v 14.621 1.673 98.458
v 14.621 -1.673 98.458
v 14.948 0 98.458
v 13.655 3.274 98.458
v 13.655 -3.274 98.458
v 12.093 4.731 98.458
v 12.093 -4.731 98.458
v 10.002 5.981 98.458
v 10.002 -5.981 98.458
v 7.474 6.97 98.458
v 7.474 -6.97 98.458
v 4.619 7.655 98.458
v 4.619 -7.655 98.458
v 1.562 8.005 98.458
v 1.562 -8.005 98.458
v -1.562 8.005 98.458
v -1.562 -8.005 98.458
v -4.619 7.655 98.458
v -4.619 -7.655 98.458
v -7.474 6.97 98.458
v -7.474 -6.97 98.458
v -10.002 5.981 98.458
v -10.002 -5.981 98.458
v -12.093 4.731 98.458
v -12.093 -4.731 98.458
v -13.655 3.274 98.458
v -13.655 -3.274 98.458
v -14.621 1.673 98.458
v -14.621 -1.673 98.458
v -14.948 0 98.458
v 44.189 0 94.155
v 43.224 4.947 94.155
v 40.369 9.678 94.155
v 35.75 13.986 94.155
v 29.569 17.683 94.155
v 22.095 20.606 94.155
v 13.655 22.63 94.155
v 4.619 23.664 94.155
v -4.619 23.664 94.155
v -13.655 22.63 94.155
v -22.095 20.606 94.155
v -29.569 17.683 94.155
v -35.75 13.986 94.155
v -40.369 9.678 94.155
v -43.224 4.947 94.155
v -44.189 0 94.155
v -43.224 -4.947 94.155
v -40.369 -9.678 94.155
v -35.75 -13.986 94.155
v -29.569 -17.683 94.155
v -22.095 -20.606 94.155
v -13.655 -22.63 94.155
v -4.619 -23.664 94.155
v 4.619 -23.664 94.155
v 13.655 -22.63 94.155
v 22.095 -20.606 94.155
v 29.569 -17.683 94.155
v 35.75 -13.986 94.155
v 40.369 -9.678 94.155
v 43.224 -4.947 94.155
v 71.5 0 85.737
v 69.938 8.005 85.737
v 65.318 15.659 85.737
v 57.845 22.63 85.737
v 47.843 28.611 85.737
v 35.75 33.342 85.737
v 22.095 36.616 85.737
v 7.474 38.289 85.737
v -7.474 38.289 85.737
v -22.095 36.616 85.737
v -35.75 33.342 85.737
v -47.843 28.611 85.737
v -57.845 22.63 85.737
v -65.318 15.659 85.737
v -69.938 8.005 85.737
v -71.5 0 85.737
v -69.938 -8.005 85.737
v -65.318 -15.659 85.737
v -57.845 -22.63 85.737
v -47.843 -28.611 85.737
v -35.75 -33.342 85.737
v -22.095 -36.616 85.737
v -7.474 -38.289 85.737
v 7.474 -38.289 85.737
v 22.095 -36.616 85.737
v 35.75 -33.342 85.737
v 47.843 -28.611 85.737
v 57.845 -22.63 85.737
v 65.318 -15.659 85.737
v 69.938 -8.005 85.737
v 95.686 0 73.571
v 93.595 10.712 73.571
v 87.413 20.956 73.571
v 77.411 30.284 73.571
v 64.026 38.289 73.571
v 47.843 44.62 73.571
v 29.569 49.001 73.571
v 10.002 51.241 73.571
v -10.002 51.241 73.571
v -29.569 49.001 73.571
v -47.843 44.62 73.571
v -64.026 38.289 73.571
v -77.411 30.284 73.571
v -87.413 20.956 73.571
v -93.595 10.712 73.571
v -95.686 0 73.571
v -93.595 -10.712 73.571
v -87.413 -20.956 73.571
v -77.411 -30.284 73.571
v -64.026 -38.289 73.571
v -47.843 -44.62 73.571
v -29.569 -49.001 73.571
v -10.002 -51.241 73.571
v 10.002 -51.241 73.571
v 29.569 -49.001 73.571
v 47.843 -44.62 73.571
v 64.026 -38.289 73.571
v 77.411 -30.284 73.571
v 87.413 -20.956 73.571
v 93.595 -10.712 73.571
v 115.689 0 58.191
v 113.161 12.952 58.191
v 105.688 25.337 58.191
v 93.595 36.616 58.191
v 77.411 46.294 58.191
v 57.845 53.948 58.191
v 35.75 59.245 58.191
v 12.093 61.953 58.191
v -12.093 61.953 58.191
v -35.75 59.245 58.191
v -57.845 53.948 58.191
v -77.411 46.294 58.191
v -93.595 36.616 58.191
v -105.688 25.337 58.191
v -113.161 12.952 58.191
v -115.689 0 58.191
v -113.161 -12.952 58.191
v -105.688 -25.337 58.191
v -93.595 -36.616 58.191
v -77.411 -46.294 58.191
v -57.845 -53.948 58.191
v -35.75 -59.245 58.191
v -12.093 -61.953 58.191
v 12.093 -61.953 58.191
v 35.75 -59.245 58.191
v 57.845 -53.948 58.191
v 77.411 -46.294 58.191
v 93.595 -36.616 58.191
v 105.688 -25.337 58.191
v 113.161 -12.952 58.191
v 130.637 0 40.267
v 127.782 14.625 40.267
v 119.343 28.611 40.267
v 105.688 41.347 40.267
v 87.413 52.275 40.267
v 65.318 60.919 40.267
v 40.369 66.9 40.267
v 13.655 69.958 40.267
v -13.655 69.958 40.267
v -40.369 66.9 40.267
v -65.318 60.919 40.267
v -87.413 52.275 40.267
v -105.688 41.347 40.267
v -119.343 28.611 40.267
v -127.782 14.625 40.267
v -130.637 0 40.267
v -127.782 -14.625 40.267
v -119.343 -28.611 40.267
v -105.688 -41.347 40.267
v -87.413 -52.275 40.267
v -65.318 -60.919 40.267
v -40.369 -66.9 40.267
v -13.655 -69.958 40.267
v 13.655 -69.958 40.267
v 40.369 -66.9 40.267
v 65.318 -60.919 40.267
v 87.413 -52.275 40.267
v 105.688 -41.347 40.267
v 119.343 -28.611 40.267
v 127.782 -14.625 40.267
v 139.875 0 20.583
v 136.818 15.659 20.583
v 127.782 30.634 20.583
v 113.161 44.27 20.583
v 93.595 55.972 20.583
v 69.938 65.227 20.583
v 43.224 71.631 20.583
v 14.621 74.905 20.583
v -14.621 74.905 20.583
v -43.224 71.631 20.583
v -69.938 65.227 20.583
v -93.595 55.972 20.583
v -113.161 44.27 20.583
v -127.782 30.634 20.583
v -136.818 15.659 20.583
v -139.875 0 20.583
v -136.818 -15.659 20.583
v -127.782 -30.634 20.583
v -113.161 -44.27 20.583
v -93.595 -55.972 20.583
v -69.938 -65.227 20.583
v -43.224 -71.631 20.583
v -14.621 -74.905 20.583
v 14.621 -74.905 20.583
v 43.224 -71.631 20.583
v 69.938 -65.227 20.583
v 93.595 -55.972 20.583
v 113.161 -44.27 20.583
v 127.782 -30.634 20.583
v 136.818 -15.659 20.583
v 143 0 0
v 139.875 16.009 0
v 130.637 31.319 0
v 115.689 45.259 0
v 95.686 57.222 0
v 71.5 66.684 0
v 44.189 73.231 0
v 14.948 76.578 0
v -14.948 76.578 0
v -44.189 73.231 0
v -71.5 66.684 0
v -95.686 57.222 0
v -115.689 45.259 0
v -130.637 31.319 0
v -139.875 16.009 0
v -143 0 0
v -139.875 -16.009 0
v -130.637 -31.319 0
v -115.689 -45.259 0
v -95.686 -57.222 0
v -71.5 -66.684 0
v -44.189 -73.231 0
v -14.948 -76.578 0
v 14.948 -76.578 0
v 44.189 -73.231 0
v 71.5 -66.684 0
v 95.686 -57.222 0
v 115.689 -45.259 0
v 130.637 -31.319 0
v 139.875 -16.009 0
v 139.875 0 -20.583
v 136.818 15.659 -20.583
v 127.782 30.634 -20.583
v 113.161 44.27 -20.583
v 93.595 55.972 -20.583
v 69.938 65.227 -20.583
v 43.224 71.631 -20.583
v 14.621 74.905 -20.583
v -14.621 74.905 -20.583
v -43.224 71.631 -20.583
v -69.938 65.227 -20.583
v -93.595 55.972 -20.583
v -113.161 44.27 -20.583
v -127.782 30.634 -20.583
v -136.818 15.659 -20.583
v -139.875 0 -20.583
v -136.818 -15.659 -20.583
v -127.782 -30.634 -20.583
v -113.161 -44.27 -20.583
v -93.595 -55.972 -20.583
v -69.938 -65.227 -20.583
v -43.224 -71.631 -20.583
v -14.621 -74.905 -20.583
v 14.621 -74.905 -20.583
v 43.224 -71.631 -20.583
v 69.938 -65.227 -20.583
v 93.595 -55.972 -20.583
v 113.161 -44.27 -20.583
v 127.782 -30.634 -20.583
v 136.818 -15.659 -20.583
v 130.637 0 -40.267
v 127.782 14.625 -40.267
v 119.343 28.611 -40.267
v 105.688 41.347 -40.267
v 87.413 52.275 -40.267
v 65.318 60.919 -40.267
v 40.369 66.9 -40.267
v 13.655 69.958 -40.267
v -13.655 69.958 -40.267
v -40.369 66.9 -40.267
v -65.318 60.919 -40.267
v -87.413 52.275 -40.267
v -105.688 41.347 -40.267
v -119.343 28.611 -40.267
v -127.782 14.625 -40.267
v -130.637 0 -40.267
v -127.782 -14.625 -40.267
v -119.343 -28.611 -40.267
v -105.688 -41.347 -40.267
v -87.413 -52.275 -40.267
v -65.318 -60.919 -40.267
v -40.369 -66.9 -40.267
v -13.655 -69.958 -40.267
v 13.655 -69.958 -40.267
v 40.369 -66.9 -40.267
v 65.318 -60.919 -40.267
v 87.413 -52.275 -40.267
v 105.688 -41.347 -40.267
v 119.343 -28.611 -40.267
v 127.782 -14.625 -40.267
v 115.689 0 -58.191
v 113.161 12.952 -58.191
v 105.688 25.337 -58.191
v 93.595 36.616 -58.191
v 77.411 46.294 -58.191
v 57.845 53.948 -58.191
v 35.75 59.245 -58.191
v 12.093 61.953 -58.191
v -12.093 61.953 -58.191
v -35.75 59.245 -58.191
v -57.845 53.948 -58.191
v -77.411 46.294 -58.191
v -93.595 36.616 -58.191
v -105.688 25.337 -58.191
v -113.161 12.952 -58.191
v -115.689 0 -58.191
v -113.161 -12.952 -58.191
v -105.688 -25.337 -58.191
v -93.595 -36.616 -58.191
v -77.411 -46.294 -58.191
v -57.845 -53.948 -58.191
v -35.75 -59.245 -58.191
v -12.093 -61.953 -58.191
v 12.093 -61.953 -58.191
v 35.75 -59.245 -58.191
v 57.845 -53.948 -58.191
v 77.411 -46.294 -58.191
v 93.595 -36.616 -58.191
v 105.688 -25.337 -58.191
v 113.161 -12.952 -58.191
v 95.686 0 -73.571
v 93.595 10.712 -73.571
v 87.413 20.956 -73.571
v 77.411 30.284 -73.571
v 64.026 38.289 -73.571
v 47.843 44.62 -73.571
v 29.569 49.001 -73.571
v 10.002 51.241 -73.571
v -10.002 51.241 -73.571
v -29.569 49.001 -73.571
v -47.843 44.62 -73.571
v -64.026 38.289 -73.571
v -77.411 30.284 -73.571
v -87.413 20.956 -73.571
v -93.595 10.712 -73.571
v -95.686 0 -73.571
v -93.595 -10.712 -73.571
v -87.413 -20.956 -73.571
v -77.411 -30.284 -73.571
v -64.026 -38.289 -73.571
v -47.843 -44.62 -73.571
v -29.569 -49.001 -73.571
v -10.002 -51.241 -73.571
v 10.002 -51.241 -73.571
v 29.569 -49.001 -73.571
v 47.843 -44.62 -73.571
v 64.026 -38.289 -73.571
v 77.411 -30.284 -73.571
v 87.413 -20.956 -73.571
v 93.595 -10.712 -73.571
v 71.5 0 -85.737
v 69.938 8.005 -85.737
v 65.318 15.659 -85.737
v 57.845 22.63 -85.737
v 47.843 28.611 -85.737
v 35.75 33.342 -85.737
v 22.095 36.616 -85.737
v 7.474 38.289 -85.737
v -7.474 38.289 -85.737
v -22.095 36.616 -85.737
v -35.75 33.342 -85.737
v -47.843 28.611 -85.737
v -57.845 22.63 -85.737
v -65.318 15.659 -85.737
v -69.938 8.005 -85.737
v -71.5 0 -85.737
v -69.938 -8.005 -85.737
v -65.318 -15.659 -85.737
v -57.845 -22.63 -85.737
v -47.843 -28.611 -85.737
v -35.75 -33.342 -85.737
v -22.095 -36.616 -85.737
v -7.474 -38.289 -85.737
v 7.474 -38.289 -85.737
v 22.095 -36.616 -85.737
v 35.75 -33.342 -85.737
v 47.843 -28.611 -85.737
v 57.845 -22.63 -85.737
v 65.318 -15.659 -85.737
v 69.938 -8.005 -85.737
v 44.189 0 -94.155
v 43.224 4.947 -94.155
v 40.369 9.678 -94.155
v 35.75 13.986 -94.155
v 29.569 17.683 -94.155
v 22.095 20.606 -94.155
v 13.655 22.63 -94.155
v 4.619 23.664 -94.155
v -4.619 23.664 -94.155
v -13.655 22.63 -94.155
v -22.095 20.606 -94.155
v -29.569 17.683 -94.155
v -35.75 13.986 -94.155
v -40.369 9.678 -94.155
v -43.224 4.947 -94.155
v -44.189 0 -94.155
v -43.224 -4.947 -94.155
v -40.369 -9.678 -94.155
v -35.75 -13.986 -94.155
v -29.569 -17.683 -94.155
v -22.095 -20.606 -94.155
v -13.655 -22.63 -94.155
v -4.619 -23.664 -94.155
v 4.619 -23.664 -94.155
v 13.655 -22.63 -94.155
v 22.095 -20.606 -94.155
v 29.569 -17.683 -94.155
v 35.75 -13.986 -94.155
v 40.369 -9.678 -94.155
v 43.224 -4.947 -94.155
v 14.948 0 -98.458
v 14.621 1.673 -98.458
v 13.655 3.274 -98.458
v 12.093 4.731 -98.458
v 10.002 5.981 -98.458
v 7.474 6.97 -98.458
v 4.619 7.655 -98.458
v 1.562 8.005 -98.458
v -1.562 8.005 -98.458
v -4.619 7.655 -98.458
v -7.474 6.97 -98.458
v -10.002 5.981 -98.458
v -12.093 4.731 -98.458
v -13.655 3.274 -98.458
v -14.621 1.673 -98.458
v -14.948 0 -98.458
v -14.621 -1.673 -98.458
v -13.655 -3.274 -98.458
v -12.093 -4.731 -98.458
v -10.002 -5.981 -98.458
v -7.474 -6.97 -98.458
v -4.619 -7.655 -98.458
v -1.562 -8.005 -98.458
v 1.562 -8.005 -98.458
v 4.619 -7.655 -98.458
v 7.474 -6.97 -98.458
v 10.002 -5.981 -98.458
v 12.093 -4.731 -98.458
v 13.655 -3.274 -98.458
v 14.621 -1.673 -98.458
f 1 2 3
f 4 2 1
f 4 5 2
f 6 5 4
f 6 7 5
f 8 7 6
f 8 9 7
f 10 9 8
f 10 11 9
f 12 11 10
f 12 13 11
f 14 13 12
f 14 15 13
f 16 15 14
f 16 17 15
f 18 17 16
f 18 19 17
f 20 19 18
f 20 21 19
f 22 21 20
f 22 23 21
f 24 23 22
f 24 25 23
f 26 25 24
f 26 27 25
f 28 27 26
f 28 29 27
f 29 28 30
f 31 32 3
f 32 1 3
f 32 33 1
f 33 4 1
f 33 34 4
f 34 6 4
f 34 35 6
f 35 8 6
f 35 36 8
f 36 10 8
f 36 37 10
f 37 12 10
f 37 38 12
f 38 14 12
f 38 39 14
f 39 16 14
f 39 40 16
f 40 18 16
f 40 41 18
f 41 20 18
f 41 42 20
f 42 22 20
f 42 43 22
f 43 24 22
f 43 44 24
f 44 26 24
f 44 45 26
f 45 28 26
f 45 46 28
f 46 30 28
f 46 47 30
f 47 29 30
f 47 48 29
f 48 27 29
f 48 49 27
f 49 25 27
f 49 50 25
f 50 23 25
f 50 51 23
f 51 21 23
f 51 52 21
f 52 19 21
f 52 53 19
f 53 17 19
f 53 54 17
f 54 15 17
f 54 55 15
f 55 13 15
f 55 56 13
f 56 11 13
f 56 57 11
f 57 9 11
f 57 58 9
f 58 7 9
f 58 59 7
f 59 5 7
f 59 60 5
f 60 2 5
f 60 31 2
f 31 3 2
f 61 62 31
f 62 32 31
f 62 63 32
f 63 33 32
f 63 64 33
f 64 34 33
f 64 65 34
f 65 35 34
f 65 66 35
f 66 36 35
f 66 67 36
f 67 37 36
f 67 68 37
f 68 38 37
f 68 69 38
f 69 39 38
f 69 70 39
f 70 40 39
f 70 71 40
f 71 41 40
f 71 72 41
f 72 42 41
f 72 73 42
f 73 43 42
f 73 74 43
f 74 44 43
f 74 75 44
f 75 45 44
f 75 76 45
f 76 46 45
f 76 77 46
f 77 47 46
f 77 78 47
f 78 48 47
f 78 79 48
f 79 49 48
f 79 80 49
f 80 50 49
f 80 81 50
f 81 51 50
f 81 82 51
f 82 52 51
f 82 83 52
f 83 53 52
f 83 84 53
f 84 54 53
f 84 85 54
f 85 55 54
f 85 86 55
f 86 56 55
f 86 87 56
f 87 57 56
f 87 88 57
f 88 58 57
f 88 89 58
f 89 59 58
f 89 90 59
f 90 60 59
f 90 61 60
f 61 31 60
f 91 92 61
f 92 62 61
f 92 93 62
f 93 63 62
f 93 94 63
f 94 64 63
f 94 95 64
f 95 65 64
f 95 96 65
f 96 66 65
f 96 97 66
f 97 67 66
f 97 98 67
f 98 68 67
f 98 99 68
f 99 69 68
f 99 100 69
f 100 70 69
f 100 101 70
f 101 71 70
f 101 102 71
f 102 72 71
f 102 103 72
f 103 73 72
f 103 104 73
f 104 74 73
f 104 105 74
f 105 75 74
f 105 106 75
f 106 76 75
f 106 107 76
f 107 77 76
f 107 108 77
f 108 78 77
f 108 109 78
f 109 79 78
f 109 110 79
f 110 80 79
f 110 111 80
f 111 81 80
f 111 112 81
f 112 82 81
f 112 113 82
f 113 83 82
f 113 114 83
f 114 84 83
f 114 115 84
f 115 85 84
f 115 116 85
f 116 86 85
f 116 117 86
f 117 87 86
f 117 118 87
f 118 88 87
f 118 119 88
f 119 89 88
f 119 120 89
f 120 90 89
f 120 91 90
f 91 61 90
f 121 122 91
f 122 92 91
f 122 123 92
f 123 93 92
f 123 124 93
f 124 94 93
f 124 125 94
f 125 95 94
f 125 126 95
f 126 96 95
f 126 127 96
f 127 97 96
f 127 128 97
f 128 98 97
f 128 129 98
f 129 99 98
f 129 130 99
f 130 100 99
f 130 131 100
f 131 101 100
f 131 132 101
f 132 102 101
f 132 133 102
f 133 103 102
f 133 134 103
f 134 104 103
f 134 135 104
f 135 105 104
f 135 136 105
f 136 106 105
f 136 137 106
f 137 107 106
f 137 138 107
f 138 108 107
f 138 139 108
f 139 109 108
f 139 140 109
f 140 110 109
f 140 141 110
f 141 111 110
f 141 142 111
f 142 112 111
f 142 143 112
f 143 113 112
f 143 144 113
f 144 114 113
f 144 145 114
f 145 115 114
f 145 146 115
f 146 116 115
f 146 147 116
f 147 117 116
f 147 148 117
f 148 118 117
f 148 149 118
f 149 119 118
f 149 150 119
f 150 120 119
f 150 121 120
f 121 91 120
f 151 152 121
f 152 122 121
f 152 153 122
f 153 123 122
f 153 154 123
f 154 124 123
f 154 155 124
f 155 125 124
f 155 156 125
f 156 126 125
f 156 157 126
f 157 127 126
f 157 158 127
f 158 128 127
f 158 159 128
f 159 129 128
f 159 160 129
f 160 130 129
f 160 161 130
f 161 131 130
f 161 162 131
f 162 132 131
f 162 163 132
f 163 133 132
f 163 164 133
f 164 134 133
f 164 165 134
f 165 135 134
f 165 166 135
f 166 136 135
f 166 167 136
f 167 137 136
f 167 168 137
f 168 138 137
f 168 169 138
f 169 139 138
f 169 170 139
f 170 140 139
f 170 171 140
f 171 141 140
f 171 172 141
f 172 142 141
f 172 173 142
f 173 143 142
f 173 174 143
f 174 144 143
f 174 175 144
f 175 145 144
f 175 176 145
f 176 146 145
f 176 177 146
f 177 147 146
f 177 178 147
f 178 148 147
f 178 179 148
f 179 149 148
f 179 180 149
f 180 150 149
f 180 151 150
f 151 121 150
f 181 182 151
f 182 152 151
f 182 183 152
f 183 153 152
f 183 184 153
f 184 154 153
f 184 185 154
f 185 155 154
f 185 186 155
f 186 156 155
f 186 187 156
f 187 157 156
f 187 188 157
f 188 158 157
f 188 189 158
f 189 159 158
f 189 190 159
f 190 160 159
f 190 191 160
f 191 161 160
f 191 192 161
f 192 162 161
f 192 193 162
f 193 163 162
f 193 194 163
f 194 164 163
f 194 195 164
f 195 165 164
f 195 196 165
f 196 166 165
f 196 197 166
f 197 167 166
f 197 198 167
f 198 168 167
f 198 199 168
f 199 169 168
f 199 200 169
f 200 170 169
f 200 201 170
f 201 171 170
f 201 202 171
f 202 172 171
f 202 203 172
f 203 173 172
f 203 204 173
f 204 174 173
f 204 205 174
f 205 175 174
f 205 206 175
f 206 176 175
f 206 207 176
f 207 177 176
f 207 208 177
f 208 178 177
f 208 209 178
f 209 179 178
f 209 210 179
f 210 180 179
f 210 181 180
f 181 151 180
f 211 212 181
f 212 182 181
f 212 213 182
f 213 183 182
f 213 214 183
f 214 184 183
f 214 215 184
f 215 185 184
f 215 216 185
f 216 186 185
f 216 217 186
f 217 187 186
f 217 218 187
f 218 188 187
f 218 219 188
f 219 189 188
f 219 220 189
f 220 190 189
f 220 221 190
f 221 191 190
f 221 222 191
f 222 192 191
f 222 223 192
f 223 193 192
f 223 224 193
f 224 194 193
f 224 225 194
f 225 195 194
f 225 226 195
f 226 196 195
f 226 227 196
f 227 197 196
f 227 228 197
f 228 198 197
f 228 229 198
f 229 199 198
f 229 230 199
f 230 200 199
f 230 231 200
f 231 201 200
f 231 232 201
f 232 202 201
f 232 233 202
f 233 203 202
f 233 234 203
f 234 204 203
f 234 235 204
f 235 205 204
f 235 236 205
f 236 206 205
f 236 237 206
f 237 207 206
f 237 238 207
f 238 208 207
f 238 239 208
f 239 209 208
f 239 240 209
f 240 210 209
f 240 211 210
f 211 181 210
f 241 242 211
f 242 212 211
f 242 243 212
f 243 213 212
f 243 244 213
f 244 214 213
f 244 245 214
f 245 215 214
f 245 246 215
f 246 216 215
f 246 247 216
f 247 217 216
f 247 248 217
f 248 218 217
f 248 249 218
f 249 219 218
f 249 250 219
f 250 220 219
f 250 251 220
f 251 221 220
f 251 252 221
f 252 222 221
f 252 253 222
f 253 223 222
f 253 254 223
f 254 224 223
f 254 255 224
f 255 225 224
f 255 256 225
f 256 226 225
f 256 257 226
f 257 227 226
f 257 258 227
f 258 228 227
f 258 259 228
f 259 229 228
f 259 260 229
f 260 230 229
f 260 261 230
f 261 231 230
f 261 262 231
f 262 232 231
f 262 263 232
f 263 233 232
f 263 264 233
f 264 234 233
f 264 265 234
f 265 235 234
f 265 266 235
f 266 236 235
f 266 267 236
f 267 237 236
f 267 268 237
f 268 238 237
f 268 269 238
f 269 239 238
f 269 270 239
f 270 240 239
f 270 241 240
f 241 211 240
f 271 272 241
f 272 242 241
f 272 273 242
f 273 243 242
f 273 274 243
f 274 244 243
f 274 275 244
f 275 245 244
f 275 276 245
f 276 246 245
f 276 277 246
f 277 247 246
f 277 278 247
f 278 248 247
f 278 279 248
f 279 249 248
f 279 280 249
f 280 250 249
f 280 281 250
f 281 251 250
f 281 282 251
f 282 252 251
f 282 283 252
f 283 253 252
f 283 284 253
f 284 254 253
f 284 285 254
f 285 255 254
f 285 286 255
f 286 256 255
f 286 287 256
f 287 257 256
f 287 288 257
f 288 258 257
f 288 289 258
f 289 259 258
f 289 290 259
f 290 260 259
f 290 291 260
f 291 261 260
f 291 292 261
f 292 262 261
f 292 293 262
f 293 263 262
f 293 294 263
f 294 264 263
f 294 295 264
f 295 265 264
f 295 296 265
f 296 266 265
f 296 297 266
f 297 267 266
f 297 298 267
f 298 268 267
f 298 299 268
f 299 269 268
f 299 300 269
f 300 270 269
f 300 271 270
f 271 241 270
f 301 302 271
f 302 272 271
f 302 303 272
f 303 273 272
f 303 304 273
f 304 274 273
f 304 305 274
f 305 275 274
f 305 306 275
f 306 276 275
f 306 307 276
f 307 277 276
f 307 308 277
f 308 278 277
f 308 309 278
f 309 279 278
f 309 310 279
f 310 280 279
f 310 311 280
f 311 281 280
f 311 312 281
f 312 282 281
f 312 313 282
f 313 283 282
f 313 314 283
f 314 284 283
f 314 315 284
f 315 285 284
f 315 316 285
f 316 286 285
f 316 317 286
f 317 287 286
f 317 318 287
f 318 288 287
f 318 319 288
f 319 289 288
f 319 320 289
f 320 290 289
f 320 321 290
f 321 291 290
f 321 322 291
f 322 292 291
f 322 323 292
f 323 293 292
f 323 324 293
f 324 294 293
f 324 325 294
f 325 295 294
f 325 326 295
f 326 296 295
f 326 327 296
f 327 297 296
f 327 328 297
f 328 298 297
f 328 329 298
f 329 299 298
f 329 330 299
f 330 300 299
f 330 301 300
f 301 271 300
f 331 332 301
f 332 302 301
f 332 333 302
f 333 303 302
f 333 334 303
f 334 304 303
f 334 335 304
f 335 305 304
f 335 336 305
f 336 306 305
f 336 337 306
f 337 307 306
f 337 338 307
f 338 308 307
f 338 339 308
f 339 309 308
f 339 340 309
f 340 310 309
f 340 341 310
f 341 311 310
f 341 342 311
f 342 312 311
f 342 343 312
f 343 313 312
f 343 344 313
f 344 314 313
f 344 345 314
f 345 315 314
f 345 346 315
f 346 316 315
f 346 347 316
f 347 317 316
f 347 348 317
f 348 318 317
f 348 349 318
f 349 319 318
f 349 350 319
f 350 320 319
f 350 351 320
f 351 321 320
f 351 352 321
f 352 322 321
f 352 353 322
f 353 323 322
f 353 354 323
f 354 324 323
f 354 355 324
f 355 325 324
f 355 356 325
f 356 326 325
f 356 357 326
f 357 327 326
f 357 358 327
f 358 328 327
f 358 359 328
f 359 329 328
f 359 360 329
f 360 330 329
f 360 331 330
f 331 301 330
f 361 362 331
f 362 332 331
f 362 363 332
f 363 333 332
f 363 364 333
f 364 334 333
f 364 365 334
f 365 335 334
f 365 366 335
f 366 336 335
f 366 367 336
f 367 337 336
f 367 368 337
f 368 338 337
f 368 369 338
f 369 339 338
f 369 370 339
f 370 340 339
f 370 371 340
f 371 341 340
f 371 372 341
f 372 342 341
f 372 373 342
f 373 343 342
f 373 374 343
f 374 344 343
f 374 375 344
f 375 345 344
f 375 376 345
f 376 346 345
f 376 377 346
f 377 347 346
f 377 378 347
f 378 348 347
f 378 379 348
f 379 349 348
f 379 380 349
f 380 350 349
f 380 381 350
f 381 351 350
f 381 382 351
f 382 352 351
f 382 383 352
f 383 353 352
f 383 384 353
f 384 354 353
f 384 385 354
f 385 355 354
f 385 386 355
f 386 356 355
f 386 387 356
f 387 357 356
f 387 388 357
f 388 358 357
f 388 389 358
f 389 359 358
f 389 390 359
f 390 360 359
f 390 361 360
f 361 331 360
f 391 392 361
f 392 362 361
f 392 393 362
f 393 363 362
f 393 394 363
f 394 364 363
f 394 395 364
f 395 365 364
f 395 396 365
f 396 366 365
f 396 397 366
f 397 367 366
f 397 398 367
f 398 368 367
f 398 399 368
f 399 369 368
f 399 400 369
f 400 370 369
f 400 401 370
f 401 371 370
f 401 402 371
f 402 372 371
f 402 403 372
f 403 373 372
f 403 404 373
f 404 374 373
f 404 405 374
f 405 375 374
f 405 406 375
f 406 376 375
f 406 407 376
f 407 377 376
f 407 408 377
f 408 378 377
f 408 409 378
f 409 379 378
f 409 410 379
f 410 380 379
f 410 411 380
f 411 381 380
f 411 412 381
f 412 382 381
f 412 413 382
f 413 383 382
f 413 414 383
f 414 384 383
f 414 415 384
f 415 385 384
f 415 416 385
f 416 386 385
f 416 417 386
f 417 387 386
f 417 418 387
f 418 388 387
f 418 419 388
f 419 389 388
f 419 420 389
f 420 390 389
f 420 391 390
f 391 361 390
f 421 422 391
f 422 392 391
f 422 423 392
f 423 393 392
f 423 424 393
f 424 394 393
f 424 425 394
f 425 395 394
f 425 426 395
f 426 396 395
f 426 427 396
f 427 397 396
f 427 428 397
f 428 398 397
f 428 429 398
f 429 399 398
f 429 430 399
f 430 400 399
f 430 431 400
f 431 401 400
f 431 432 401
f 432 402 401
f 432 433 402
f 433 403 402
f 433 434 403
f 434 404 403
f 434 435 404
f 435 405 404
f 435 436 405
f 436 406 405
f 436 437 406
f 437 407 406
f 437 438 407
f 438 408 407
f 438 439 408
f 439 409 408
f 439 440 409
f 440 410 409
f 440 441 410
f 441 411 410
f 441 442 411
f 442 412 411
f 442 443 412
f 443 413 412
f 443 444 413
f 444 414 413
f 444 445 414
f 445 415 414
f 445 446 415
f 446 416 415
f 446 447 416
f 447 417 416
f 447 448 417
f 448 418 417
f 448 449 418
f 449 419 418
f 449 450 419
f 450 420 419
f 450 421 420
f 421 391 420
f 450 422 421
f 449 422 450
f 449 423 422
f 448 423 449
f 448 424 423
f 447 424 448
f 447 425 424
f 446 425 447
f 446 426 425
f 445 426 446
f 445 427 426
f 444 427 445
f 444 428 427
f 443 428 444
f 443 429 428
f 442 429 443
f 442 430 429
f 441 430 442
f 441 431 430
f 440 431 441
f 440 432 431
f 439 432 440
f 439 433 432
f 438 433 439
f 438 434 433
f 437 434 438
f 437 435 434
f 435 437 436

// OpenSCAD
// Generated by SolidPython 1.0.1 on 2020-07-29 00:46:50


scale(v = [13, 7, 9]) {
	sphere(r = 11);
}
/***********************************************
*********      SolidPython code:      **********
************************************************
 
# import packages: SolidPython
from solid import *
from solid.utils import *
from itertools import chain, combinations, permutations


class Resize:

    def __init__(self, scad_file):
        self.scad_file = scad_file
        #self.scad_file = import_scad(scad_file)
        # cone/cylinder param:
        self.r1 = 0
        self.r2 = 0
        self.h = 0
        # rectangular prism param:
        self.w = 0
        self.l = 0
        # ellipse param:
        self.r = 0

    # import OpenScad code (file name corresponds to shape)


    # classify shape + parameters
    def assign(self, param1, param2, param3):
        if self.scad_file == 'cone.scad':
            self.r1 = param1
            self.r2 = param2
            self.h = param3
        elif self.scad_file == 'cylinder.scad':
            self.r1 = param1
            self.r2 = param2
            self.h = param3
        elif self.scad_file == 'rectangularPrism.scad':
            self.h = param1
            self.l = param2
            self.w = param3
        else:
            self.r = param1
            self.h = param2

    # resize parameters
    def iterate(self):
        x = range(3, 20, 2)
        i = 1
        if self.scad_file == 'cone.scad':
            tempList = list(permutations(x, 2))
            for temp in tempList:
                param1 = temp[0]
                param2 = temp[1]
                filepath = 'produced_scad_files/' + 'cone' + str(param1) + '_' + str(param2) + '_' + '.scad'
                scad_render_to_file(cylinder(h=param1, r1=param2, r2=0), filepath)

        elif self.scad_file == 'cylinder.scad':
            tempList = list(permutations(x, 3))
            for temp in tempList:
                param1 = temp[0]
                param2 = temp[1]
                filepath = 'produced_scad_files/' + 'cylinder' + str(param1) + '_' + str(param2) + '_' + '.scad'
                scad_render_to_file(cylinder(h=param1, r1=param2, r2=param2), filepath)

        elif self.scad_file == 'rectangularPrism.scad':
            tempList = list(permutations(x, 3))
            for temp in tempList:
                param1 = temp[0]
                param2 = temp[1]
                param3 = temp[2]
                filepath = 'produced_scad_files/' + 'rectangularPrism' + str(param1) + '_' + str(param2) + '_' + str(
                    param3) + '.scad'
                scad_render_to_file(cube(size=(param1, param2, param3)), filepath)

        elif self.scad_file == 'ellipse.scad':
            tempList = list(permutations(x, 4))
            for temp in tempList:
                param1 = temp[0]
                param2 = temp[1]
                param3 = temp[2]
                param4 = temp[3]
                filepath = 'produced_scad_files/' + 'ellipse' + str(param1) + '_' + str(param2) + '_' + str(param3) + '_' + str(param4) + '.scad'
                scad_render_to_file(scale([param1, param2, param3])(sphere(r=param4)), filepath)

    def render_to_scadfile(self):
        scad_render_to_file(scad, 'example.scad') 
 
************************************************/
